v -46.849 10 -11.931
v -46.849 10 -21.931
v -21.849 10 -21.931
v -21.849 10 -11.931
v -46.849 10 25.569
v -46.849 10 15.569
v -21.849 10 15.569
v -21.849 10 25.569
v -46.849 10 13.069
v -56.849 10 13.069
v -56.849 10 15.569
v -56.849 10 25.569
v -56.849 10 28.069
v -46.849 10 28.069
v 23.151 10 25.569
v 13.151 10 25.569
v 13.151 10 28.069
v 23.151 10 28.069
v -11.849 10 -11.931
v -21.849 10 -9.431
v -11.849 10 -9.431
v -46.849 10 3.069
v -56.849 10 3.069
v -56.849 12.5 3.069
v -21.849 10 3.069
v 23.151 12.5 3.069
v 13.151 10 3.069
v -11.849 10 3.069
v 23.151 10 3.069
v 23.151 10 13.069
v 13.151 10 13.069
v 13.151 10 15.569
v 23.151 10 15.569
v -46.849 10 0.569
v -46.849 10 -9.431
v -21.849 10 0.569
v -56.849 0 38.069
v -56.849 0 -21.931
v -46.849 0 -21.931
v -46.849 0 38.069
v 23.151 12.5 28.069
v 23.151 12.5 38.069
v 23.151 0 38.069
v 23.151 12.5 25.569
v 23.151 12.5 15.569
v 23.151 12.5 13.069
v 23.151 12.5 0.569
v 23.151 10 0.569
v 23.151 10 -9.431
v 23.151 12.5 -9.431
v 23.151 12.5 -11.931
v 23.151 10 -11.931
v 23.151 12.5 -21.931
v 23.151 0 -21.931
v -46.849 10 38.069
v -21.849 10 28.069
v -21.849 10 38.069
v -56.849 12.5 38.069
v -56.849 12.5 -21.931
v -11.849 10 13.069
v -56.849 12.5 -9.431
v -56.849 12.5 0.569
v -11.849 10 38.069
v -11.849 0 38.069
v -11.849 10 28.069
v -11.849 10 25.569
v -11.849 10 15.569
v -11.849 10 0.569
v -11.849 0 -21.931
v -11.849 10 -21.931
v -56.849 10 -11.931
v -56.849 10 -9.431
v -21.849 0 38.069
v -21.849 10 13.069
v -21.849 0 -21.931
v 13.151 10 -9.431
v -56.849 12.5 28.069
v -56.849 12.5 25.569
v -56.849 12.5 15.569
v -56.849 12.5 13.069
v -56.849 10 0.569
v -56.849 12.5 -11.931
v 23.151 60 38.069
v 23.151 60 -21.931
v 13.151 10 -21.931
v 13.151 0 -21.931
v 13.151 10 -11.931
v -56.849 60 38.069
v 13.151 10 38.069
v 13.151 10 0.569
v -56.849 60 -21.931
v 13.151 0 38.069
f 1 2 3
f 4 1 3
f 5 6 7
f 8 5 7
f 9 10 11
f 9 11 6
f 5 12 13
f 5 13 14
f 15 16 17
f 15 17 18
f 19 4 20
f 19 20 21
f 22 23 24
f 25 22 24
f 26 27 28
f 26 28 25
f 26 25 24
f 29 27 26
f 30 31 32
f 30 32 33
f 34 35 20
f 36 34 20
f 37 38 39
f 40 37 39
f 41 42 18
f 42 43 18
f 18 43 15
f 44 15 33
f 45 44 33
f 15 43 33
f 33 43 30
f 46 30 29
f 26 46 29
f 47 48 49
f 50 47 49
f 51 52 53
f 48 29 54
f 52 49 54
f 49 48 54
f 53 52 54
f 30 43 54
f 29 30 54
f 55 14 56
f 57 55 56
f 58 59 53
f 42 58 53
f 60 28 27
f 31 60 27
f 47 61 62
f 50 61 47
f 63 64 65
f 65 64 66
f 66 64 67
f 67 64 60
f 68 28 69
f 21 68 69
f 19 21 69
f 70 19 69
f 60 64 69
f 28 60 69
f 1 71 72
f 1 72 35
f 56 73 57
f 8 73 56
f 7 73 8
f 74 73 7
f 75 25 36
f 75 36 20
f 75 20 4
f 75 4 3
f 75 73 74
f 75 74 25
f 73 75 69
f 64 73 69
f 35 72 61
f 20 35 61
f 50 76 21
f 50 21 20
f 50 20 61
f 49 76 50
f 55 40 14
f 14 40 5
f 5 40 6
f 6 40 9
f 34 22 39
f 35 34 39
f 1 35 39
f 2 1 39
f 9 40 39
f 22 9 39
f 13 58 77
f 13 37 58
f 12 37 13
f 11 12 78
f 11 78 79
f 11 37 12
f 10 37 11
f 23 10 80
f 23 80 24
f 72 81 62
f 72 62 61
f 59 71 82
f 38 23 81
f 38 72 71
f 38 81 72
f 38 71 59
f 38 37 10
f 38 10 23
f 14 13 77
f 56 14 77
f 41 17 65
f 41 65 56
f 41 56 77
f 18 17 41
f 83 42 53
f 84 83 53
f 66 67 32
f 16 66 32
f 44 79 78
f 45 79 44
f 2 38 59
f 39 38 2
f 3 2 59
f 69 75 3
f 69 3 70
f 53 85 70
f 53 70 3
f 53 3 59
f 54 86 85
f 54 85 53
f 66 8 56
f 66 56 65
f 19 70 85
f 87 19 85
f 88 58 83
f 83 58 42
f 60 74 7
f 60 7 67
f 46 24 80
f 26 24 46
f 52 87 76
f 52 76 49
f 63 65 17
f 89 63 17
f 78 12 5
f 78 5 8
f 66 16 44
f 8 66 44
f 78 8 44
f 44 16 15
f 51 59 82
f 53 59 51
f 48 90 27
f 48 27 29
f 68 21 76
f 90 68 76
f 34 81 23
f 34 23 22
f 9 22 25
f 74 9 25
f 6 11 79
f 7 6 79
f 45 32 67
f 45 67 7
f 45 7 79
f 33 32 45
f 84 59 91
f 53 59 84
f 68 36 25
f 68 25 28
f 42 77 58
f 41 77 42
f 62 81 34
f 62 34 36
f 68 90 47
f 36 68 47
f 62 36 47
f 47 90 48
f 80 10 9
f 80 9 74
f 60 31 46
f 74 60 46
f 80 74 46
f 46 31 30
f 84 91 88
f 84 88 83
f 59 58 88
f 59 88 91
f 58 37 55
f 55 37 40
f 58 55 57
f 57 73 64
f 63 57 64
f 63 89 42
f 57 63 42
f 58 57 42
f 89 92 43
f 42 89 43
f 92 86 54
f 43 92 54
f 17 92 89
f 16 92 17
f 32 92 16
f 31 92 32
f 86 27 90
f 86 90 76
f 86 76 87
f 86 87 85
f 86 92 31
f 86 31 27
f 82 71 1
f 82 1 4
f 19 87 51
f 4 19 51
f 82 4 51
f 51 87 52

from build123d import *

# Parameters (mm, degrees)
CROQUIS1_W                = 10
CROQUIS1_H                = 60
SALIENTE_EXTRUIR1_DEPTH   = 10
SALIENTE_EXTRUIR1_2_DEPTH = 10
SALIENTE_EXTRUIR1_3_DEPTH = 10
CROQUIS2_W                = 80
CROQUIS2_H                = 10
SALIENTE_EXTRUIR2_DEPTH   = 2.5
CROQUIS3_W                = 80
CROQUIS3_H                = 60
SALIENTE_EXTRUIR5_DEPTH   = 47.5


with BuildPart() as part:
    # Croquis1 → Saliente-Extruir1 (new body)
    with BuildSketch(Plane(origin=(0, 0, 0), x_dir=(1, 0, 0), z_dir=(0, 1, 0))):
        with Locations((-51.849391859, -8.068789191)):
            Rectangle(CROQUIS1_W, CROQUIS1_H)
    extrude(amount=SALIENTE_EXTRUIR1_DEPTH)



with BuildPart() as body_2:
    # Croquis1 → Saliente-Extruir1 2 (new body)
    with BuildSketch(Plane(origin=(0, 0, 0), x_dir=(1, 0, 0), z_dir=(0, 1, 0))):
        with Locations((-16.849391859, -8.068789191)):
            Rectangle(CROQUIS1_W, CROQUIS1_H)
    extrude(amount=SALIENTE_EXTRUIR1_2_DEPTH)


with BuildPart() as body_3:
    # Croquis1 → Saliente-Extruir1 3 (new body)
    with BuildSketch(Plane(origin=(0, 0, 0), x_dir=(1, 0, 0), z_dir=(0, 1, 0))):
        with Locations((18.150608141, -8.068789191)):
            Rectangle(CROQUIS1_W, CROQUIS1_H)
    extrude(amount=SALIENTE_EXTRUIR1_3_DEPTH)


with BuildPart() as part_1:
    add(part.part)

    add(body_2.part)  # Saliente-Extruir2 merges body 2

    add(body_3.part)  # Saliente-Extruir2 merges body 3
    # Croquis2 → Saliente-Extruir2 (add)
    with BuildSketch(Plane(origin=(0, 10, 0), x_dir=(1, 0, 0), z_dir=(0, 1, 0))):
        with Locations((-16.849391859, -33.068789191)):
            Rectangle(CROQUIS2_W, CROQUIS2_H)
        with Locations((-16.849391859, 16.931210809)):
            Rectangle(CROQUIS2_W, CROQUIS2_H)
        with Locations((-16.849391859, 4.431210809)):
            Rectangle(CROQUIS2_W, CROQUIS2_H)
        with Locations((-16.849391859, -20.568789191)):
            Rectangle(CROQUIS2_W, CROQUIS2_H)
        with Locations((-16.849391859, -8.068789191)):
            Rectangle(CROQUIS2_W, CROQUIS2_H)
    extrude(amount=SALIENTE_EXTRUIR2_DEPTH)


with BuildPart() as body_2_2:
    # Croquis3 → Saliente-Extruir5 (new body)
    with BuildSketch(Plane(origin=(0, 12.5, 0), x_dir=(1, 0, 0), z_dir=(0, 1, 0))):
        with Locations((-16.849391859, -8.068789191)):
            Rectangle(CROQUIS3_W, CROQUIS3_H)
    extrude(amount=SALIENTE_EXTRUIR5_DEPTH)


solid = Compound([part_1.part, body_2_2.part])
